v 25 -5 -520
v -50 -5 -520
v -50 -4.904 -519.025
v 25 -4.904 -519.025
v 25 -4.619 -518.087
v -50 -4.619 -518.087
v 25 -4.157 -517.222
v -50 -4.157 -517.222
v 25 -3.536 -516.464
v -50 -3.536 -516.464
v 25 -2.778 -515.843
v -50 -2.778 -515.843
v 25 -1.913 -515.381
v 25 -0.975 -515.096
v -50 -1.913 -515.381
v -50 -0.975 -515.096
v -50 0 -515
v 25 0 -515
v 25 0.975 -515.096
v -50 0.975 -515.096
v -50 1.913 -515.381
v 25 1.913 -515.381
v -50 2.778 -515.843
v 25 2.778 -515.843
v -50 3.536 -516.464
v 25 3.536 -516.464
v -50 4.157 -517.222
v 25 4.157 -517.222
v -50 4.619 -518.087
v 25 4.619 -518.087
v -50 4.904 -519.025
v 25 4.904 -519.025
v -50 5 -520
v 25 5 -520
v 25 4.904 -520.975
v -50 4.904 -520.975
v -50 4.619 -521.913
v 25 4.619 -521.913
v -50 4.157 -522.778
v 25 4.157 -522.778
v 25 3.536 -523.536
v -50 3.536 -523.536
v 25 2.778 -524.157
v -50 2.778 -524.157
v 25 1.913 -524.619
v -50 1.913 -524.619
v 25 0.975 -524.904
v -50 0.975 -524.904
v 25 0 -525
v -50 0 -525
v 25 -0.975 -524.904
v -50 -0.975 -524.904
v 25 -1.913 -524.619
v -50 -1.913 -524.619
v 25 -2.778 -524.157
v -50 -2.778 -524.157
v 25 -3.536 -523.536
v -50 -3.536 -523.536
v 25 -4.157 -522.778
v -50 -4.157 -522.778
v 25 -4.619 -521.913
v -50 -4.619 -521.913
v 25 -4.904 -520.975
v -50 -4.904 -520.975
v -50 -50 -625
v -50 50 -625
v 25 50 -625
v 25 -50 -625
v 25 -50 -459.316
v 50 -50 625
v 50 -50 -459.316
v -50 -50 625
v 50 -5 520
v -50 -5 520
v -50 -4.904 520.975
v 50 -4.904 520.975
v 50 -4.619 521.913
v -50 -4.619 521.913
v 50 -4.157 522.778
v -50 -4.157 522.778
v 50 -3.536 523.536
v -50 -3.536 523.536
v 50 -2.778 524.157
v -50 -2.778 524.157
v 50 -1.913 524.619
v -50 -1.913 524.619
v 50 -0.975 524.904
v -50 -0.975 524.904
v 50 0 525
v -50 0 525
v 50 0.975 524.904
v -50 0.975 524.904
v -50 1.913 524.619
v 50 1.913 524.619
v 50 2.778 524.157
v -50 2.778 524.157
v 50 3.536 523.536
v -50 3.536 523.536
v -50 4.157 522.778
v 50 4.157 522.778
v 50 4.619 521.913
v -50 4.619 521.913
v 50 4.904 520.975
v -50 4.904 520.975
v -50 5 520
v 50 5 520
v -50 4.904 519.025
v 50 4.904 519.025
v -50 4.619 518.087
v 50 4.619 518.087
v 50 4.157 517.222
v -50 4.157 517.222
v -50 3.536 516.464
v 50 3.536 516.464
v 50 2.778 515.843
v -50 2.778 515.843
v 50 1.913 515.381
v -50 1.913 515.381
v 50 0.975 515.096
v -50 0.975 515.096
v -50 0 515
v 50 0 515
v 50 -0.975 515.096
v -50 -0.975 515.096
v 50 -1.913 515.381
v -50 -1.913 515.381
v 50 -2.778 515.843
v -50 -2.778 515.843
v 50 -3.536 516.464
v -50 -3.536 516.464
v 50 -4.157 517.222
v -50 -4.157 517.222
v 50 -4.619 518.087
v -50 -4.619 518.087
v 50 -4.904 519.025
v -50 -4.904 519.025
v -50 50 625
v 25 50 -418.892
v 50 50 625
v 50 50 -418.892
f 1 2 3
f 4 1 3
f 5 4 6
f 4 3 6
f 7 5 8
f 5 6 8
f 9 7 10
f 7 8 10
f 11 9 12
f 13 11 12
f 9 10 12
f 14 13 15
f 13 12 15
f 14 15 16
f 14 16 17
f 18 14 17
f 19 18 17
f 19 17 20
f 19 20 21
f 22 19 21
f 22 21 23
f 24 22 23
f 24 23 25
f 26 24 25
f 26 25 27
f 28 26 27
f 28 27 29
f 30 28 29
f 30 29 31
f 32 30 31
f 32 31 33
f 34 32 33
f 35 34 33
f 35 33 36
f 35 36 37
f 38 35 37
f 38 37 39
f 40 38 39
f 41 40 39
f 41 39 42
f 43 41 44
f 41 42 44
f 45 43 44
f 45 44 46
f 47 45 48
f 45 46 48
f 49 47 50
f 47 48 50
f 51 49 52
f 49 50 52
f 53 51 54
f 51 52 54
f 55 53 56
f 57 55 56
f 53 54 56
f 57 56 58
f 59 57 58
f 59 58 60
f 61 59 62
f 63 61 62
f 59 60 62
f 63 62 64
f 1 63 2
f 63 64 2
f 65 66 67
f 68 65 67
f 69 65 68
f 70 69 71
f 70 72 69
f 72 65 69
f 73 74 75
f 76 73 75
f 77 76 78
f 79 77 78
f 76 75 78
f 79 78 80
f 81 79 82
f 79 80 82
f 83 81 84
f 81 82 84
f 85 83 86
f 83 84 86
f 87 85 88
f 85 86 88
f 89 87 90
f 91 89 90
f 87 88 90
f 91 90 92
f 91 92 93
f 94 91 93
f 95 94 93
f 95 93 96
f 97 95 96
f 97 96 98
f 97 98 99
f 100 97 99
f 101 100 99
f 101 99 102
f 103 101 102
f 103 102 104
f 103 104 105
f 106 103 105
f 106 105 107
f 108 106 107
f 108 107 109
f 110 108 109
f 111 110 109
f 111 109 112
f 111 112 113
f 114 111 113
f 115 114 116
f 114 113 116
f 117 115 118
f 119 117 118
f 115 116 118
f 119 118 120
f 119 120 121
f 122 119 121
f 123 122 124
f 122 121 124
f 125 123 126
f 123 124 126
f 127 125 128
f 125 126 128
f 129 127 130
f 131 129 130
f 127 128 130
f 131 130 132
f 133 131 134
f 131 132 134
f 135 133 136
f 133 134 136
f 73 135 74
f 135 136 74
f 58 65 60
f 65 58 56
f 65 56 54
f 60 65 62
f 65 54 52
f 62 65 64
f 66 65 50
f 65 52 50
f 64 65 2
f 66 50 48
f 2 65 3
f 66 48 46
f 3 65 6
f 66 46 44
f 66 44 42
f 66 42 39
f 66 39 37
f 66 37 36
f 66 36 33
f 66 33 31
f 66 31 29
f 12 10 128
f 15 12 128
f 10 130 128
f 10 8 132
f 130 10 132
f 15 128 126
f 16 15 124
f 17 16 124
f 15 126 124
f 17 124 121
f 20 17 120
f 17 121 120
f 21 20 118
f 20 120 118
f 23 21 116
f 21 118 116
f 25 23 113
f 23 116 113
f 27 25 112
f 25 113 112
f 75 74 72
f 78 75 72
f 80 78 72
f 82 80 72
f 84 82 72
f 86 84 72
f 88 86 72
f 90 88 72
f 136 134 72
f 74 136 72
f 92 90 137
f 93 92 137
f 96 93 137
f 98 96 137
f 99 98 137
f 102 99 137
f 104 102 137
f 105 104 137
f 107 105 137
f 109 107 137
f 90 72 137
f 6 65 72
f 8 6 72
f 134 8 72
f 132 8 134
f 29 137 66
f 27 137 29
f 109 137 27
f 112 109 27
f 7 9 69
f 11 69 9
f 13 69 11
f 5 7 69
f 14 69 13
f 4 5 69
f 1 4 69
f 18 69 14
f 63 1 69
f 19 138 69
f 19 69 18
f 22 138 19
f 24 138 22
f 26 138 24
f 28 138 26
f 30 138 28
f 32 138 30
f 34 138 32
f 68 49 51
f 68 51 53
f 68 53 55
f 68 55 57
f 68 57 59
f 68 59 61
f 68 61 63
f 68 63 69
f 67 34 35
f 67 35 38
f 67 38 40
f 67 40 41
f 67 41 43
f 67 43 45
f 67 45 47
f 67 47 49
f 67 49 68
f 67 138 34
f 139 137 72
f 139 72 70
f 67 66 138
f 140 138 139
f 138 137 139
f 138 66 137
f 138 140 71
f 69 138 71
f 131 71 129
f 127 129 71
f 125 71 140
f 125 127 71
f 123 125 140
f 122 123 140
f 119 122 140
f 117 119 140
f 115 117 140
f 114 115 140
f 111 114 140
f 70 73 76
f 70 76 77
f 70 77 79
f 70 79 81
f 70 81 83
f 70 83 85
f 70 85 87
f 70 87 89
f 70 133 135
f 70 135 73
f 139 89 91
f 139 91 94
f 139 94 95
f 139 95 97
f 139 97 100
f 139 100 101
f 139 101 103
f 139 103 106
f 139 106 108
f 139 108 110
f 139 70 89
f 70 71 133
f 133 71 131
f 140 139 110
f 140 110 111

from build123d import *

# Parameters (mm, degrees)
SKETCH1_W           = 100
SKETCH1_H           = 100
BOSS_EXTRUDE1_DEPTH = 625
SKETCH2_R           = 5
CUT_EXTRUDE1_DEPTH  = 635.92125496
CUT_EXTRUDE2_DEPTH  = 25


with BuildPart() as part:
    # Sketch1 → Boss-Extrude1 (new, symmetric)
    with BuildSketch(Plane.XY):
        Rectangle(SKETCH1_W, SKETCH1_H)
    extrude(amount=BOSS_EXTRUDE1_DEPTH, both=True)

    # Sketch2 → Cut-Extrude1 (cut, through all)
    with BuildSketch(Plane.ZY.offset(50)):
        with Locations(Location((-520, 0, 0), (0, 0, 270))):
            Circle(SKETCH2_R)
        with Locations(Location((520, 0, 0), (0, 0, 270))):
            Circle(SKETCH2_R)
    extrude(amount=-CUT_EXTRUDE1_DEPTH, mode=Mode.SUBTRACT)

    # Sketch3 → Cut-Extrude2 (cut)
    with BuildSketch(Plane(origin=(50, 0, 0), x_dir=(0, 0, -1), z_dir=(1, 0, 0))):
        Polygon((418.892046252, 50), (459.315842164, -50), (625, -50), (625, 50), align=None)
    extrude(amount=-CUT_EXTRUDE2_DEPTH, mode=Mode.SUBTRACT)


solid = part.part
